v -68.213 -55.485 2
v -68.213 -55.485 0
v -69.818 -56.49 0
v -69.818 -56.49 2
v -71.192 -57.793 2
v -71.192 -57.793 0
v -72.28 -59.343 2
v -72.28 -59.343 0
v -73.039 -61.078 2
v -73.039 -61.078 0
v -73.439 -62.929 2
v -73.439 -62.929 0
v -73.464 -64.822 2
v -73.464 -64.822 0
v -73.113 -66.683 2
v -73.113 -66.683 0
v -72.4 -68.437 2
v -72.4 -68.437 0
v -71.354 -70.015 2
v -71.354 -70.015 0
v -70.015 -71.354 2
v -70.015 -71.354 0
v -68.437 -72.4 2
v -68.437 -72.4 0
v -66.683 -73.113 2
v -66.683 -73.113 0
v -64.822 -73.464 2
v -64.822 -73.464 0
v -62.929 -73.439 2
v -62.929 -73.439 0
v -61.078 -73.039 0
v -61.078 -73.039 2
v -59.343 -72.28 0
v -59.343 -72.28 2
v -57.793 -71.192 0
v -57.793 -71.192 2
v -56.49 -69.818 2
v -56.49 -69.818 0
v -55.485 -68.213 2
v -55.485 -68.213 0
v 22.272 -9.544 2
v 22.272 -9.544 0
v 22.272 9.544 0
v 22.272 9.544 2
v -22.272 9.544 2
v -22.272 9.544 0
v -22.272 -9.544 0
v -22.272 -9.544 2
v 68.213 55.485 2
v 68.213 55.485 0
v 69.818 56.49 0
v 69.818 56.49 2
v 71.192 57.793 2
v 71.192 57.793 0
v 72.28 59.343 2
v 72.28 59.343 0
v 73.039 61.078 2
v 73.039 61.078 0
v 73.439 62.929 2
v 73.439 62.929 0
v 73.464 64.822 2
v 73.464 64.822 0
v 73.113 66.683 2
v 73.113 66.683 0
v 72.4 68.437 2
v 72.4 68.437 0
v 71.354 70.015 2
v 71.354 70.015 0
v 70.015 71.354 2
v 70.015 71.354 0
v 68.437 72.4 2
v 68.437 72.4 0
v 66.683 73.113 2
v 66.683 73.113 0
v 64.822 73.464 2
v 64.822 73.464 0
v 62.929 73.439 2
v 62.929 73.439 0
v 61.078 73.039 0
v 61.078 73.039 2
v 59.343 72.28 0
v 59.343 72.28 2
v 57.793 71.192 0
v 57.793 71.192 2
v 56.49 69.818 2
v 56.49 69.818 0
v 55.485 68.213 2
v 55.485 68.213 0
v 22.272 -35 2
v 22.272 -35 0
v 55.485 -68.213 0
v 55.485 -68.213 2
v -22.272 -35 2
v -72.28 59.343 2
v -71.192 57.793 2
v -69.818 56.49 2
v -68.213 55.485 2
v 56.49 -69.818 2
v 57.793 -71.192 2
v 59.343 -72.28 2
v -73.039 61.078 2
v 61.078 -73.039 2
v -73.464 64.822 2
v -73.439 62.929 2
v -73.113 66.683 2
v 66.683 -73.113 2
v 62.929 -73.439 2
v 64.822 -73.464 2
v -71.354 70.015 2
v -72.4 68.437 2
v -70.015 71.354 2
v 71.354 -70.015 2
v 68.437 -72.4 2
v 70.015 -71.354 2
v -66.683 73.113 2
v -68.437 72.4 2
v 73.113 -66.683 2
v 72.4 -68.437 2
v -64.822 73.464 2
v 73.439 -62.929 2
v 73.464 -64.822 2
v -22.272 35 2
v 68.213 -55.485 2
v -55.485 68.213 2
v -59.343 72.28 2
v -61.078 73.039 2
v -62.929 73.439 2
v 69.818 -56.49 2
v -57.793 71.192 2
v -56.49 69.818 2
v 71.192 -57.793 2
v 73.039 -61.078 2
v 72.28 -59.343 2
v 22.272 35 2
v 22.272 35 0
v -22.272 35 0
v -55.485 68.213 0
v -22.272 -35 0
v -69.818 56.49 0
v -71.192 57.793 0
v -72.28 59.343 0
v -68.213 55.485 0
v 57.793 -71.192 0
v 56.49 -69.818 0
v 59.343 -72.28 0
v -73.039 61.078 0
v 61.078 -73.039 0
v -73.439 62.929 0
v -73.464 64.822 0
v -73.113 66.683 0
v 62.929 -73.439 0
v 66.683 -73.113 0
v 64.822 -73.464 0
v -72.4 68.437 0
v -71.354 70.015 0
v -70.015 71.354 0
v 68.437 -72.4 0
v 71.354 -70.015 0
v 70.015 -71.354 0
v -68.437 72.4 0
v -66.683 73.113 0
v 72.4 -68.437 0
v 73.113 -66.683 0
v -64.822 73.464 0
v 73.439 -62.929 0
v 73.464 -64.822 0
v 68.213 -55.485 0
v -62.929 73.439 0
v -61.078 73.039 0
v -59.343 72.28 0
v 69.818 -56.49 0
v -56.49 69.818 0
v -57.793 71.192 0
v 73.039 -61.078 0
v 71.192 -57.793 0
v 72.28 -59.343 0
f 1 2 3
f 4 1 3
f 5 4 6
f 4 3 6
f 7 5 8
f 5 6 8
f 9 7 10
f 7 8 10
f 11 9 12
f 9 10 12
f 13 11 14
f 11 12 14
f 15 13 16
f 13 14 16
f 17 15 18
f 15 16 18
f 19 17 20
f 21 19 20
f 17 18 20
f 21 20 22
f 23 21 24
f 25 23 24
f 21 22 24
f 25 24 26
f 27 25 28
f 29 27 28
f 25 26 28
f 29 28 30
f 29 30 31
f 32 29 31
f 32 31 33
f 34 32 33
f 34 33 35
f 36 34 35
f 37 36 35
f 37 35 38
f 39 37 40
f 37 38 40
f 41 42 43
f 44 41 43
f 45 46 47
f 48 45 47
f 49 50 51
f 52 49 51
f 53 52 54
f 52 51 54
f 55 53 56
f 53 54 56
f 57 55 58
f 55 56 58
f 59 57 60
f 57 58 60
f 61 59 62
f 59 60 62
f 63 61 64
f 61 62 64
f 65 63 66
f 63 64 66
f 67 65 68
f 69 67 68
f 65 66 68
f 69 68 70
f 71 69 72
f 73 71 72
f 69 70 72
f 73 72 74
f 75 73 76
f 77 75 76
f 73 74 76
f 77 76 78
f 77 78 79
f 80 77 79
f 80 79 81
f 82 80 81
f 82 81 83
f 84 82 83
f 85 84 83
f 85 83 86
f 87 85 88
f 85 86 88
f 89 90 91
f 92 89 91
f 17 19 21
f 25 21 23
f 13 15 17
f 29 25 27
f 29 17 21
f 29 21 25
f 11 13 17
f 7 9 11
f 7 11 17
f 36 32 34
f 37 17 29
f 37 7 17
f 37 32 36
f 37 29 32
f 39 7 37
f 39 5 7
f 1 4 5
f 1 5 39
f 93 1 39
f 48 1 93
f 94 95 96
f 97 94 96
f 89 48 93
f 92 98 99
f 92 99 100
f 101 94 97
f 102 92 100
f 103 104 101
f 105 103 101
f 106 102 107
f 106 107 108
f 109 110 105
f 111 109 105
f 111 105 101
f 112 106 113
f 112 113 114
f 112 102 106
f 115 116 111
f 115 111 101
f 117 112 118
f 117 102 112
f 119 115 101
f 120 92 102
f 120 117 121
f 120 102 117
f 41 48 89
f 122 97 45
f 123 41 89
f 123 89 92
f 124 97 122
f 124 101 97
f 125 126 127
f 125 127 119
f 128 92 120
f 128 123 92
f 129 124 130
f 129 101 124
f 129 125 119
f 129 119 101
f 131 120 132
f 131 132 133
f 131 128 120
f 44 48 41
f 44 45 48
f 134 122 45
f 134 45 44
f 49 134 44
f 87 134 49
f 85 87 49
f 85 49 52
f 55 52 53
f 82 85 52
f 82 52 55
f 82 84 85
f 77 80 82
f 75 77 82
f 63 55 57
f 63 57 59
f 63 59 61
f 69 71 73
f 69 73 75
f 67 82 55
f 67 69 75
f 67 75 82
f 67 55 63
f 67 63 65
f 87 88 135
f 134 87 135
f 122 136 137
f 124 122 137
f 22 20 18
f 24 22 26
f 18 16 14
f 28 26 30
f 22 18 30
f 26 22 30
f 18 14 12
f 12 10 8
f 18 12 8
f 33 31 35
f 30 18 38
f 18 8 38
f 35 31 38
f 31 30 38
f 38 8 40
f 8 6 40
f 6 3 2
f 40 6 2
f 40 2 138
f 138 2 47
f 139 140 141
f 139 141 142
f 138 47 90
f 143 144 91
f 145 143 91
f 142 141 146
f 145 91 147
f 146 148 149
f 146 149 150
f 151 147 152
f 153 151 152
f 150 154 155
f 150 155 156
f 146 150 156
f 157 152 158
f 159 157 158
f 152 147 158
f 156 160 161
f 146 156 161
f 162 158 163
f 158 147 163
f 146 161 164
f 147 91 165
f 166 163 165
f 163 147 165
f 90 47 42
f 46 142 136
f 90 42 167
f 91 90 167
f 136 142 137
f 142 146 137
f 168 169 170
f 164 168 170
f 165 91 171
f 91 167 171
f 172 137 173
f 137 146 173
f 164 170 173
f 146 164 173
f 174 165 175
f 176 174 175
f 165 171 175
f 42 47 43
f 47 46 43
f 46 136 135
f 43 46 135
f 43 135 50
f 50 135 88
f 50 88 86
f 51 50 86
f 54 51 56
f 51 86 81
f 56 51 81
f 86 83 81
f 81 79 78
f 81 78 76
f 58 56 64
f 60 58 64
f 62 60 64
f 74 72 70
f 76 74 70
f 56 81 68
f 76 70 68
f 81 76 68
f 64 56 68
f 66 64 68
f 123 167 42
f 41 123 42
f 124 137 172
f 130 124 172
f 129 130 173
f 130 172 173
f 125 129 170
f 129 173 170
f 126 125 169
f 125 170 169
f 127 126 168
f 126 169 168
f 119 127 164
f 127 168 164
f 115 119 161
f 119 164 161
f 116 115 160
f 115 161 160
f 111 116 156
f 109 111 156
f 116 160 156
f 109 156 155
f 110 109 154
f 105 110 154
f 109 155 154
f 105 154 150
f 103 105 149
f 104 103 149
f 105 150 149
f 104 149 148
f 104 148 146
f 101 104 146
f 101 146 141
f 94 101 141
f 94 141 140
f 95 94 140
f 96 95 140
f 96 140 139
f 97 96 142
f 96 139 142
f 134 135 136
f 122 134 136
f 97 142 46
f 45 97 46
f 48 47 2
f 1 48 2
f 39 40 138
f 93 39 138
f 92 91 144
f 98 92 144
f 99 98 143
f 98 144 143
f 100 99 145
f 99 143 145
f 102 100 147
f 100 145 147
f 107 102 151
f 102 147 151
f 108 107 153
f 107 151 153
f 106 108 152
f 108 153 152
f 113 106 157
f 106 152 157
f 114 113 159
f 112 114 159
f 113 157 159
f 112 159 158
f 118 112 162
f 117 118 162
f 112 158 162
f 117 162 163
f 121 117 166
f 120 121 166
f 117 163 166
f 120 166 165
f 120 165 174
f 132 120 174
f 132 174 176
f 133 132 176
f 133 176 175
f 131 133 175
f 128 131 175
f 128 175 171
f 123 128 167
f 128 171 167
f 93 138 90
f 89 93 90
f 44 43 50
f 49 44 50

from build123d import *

# Parameters (mm, degrees)
F1_DEPTH = 2


with BuildPart() as f1:
    # F0 (on Top) → F1 (new body)
    with BuildSketch(Plane.XY):
        with BuildLine():
            Line((-22.272078, 35), (-55.485458, 68.21338))
            ThreePointArc((-55.485458, 68.21338), (-70.717514, 70.717514), (-68.21338, 55.485458))
            Line((-68.21338, 55.485458), (-22.272078, 9.544156))
            Line((-22.272078, 9.544156), (-22.272078, 0))
            Line((-22.272078, 0), (-22.272078, -9.544156))
            Line((-22.272078, -9.544156), (-68.21338, -55.485458))
            ThreePointArc((-68.21338, -55.485458), (-70.717514, -70.717514), (-55.485458, -68.21338))
            Line((-55.485458, -68.21338), (-22.272078, -35))
            Line((-22.272078, -35), (22.272078, -35))
            Line((22.272078, -35), (55.485458, -68.21338))
            ThreePointArc((55.485458, -68.21338), (70.717514, -70.717514), (68.21338, -55.485458))
            Line((68.21338, -55.485458), (22.272078, -9.544156))
            Line((22.272078, -9.544156), (22.272078, 0))
            Line((22.272078, 0), (22.272078, 9.544156))
            Line((22.272078, 9.544156), (68.21338, 55.485458))
            ThreePointArc((68.21338, 55.485458), (70.717514, 70.717514), (55.485458, 68.21338))
            Line((55.485458, 68.21338), (22.272078, 35))
            Line((22.272078, 35), (-22.272078, 35))
        make_face()
    extrude(amount=F1_DEPTH)


solid = f1.part
